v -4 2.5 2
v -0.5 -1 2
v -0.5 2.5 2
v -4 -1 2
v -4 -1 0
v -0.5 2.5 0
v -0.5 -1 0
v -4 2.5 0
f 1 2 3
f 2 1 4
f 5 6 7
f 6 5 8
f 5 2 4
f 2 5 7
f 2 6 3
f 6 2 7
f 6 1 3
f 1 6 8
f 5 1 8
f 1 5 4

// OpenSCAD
union() {
  translate([-4.0, -1.0, 0.0]) cube(size=[3.5,3.5,2.0], center=false);
}
